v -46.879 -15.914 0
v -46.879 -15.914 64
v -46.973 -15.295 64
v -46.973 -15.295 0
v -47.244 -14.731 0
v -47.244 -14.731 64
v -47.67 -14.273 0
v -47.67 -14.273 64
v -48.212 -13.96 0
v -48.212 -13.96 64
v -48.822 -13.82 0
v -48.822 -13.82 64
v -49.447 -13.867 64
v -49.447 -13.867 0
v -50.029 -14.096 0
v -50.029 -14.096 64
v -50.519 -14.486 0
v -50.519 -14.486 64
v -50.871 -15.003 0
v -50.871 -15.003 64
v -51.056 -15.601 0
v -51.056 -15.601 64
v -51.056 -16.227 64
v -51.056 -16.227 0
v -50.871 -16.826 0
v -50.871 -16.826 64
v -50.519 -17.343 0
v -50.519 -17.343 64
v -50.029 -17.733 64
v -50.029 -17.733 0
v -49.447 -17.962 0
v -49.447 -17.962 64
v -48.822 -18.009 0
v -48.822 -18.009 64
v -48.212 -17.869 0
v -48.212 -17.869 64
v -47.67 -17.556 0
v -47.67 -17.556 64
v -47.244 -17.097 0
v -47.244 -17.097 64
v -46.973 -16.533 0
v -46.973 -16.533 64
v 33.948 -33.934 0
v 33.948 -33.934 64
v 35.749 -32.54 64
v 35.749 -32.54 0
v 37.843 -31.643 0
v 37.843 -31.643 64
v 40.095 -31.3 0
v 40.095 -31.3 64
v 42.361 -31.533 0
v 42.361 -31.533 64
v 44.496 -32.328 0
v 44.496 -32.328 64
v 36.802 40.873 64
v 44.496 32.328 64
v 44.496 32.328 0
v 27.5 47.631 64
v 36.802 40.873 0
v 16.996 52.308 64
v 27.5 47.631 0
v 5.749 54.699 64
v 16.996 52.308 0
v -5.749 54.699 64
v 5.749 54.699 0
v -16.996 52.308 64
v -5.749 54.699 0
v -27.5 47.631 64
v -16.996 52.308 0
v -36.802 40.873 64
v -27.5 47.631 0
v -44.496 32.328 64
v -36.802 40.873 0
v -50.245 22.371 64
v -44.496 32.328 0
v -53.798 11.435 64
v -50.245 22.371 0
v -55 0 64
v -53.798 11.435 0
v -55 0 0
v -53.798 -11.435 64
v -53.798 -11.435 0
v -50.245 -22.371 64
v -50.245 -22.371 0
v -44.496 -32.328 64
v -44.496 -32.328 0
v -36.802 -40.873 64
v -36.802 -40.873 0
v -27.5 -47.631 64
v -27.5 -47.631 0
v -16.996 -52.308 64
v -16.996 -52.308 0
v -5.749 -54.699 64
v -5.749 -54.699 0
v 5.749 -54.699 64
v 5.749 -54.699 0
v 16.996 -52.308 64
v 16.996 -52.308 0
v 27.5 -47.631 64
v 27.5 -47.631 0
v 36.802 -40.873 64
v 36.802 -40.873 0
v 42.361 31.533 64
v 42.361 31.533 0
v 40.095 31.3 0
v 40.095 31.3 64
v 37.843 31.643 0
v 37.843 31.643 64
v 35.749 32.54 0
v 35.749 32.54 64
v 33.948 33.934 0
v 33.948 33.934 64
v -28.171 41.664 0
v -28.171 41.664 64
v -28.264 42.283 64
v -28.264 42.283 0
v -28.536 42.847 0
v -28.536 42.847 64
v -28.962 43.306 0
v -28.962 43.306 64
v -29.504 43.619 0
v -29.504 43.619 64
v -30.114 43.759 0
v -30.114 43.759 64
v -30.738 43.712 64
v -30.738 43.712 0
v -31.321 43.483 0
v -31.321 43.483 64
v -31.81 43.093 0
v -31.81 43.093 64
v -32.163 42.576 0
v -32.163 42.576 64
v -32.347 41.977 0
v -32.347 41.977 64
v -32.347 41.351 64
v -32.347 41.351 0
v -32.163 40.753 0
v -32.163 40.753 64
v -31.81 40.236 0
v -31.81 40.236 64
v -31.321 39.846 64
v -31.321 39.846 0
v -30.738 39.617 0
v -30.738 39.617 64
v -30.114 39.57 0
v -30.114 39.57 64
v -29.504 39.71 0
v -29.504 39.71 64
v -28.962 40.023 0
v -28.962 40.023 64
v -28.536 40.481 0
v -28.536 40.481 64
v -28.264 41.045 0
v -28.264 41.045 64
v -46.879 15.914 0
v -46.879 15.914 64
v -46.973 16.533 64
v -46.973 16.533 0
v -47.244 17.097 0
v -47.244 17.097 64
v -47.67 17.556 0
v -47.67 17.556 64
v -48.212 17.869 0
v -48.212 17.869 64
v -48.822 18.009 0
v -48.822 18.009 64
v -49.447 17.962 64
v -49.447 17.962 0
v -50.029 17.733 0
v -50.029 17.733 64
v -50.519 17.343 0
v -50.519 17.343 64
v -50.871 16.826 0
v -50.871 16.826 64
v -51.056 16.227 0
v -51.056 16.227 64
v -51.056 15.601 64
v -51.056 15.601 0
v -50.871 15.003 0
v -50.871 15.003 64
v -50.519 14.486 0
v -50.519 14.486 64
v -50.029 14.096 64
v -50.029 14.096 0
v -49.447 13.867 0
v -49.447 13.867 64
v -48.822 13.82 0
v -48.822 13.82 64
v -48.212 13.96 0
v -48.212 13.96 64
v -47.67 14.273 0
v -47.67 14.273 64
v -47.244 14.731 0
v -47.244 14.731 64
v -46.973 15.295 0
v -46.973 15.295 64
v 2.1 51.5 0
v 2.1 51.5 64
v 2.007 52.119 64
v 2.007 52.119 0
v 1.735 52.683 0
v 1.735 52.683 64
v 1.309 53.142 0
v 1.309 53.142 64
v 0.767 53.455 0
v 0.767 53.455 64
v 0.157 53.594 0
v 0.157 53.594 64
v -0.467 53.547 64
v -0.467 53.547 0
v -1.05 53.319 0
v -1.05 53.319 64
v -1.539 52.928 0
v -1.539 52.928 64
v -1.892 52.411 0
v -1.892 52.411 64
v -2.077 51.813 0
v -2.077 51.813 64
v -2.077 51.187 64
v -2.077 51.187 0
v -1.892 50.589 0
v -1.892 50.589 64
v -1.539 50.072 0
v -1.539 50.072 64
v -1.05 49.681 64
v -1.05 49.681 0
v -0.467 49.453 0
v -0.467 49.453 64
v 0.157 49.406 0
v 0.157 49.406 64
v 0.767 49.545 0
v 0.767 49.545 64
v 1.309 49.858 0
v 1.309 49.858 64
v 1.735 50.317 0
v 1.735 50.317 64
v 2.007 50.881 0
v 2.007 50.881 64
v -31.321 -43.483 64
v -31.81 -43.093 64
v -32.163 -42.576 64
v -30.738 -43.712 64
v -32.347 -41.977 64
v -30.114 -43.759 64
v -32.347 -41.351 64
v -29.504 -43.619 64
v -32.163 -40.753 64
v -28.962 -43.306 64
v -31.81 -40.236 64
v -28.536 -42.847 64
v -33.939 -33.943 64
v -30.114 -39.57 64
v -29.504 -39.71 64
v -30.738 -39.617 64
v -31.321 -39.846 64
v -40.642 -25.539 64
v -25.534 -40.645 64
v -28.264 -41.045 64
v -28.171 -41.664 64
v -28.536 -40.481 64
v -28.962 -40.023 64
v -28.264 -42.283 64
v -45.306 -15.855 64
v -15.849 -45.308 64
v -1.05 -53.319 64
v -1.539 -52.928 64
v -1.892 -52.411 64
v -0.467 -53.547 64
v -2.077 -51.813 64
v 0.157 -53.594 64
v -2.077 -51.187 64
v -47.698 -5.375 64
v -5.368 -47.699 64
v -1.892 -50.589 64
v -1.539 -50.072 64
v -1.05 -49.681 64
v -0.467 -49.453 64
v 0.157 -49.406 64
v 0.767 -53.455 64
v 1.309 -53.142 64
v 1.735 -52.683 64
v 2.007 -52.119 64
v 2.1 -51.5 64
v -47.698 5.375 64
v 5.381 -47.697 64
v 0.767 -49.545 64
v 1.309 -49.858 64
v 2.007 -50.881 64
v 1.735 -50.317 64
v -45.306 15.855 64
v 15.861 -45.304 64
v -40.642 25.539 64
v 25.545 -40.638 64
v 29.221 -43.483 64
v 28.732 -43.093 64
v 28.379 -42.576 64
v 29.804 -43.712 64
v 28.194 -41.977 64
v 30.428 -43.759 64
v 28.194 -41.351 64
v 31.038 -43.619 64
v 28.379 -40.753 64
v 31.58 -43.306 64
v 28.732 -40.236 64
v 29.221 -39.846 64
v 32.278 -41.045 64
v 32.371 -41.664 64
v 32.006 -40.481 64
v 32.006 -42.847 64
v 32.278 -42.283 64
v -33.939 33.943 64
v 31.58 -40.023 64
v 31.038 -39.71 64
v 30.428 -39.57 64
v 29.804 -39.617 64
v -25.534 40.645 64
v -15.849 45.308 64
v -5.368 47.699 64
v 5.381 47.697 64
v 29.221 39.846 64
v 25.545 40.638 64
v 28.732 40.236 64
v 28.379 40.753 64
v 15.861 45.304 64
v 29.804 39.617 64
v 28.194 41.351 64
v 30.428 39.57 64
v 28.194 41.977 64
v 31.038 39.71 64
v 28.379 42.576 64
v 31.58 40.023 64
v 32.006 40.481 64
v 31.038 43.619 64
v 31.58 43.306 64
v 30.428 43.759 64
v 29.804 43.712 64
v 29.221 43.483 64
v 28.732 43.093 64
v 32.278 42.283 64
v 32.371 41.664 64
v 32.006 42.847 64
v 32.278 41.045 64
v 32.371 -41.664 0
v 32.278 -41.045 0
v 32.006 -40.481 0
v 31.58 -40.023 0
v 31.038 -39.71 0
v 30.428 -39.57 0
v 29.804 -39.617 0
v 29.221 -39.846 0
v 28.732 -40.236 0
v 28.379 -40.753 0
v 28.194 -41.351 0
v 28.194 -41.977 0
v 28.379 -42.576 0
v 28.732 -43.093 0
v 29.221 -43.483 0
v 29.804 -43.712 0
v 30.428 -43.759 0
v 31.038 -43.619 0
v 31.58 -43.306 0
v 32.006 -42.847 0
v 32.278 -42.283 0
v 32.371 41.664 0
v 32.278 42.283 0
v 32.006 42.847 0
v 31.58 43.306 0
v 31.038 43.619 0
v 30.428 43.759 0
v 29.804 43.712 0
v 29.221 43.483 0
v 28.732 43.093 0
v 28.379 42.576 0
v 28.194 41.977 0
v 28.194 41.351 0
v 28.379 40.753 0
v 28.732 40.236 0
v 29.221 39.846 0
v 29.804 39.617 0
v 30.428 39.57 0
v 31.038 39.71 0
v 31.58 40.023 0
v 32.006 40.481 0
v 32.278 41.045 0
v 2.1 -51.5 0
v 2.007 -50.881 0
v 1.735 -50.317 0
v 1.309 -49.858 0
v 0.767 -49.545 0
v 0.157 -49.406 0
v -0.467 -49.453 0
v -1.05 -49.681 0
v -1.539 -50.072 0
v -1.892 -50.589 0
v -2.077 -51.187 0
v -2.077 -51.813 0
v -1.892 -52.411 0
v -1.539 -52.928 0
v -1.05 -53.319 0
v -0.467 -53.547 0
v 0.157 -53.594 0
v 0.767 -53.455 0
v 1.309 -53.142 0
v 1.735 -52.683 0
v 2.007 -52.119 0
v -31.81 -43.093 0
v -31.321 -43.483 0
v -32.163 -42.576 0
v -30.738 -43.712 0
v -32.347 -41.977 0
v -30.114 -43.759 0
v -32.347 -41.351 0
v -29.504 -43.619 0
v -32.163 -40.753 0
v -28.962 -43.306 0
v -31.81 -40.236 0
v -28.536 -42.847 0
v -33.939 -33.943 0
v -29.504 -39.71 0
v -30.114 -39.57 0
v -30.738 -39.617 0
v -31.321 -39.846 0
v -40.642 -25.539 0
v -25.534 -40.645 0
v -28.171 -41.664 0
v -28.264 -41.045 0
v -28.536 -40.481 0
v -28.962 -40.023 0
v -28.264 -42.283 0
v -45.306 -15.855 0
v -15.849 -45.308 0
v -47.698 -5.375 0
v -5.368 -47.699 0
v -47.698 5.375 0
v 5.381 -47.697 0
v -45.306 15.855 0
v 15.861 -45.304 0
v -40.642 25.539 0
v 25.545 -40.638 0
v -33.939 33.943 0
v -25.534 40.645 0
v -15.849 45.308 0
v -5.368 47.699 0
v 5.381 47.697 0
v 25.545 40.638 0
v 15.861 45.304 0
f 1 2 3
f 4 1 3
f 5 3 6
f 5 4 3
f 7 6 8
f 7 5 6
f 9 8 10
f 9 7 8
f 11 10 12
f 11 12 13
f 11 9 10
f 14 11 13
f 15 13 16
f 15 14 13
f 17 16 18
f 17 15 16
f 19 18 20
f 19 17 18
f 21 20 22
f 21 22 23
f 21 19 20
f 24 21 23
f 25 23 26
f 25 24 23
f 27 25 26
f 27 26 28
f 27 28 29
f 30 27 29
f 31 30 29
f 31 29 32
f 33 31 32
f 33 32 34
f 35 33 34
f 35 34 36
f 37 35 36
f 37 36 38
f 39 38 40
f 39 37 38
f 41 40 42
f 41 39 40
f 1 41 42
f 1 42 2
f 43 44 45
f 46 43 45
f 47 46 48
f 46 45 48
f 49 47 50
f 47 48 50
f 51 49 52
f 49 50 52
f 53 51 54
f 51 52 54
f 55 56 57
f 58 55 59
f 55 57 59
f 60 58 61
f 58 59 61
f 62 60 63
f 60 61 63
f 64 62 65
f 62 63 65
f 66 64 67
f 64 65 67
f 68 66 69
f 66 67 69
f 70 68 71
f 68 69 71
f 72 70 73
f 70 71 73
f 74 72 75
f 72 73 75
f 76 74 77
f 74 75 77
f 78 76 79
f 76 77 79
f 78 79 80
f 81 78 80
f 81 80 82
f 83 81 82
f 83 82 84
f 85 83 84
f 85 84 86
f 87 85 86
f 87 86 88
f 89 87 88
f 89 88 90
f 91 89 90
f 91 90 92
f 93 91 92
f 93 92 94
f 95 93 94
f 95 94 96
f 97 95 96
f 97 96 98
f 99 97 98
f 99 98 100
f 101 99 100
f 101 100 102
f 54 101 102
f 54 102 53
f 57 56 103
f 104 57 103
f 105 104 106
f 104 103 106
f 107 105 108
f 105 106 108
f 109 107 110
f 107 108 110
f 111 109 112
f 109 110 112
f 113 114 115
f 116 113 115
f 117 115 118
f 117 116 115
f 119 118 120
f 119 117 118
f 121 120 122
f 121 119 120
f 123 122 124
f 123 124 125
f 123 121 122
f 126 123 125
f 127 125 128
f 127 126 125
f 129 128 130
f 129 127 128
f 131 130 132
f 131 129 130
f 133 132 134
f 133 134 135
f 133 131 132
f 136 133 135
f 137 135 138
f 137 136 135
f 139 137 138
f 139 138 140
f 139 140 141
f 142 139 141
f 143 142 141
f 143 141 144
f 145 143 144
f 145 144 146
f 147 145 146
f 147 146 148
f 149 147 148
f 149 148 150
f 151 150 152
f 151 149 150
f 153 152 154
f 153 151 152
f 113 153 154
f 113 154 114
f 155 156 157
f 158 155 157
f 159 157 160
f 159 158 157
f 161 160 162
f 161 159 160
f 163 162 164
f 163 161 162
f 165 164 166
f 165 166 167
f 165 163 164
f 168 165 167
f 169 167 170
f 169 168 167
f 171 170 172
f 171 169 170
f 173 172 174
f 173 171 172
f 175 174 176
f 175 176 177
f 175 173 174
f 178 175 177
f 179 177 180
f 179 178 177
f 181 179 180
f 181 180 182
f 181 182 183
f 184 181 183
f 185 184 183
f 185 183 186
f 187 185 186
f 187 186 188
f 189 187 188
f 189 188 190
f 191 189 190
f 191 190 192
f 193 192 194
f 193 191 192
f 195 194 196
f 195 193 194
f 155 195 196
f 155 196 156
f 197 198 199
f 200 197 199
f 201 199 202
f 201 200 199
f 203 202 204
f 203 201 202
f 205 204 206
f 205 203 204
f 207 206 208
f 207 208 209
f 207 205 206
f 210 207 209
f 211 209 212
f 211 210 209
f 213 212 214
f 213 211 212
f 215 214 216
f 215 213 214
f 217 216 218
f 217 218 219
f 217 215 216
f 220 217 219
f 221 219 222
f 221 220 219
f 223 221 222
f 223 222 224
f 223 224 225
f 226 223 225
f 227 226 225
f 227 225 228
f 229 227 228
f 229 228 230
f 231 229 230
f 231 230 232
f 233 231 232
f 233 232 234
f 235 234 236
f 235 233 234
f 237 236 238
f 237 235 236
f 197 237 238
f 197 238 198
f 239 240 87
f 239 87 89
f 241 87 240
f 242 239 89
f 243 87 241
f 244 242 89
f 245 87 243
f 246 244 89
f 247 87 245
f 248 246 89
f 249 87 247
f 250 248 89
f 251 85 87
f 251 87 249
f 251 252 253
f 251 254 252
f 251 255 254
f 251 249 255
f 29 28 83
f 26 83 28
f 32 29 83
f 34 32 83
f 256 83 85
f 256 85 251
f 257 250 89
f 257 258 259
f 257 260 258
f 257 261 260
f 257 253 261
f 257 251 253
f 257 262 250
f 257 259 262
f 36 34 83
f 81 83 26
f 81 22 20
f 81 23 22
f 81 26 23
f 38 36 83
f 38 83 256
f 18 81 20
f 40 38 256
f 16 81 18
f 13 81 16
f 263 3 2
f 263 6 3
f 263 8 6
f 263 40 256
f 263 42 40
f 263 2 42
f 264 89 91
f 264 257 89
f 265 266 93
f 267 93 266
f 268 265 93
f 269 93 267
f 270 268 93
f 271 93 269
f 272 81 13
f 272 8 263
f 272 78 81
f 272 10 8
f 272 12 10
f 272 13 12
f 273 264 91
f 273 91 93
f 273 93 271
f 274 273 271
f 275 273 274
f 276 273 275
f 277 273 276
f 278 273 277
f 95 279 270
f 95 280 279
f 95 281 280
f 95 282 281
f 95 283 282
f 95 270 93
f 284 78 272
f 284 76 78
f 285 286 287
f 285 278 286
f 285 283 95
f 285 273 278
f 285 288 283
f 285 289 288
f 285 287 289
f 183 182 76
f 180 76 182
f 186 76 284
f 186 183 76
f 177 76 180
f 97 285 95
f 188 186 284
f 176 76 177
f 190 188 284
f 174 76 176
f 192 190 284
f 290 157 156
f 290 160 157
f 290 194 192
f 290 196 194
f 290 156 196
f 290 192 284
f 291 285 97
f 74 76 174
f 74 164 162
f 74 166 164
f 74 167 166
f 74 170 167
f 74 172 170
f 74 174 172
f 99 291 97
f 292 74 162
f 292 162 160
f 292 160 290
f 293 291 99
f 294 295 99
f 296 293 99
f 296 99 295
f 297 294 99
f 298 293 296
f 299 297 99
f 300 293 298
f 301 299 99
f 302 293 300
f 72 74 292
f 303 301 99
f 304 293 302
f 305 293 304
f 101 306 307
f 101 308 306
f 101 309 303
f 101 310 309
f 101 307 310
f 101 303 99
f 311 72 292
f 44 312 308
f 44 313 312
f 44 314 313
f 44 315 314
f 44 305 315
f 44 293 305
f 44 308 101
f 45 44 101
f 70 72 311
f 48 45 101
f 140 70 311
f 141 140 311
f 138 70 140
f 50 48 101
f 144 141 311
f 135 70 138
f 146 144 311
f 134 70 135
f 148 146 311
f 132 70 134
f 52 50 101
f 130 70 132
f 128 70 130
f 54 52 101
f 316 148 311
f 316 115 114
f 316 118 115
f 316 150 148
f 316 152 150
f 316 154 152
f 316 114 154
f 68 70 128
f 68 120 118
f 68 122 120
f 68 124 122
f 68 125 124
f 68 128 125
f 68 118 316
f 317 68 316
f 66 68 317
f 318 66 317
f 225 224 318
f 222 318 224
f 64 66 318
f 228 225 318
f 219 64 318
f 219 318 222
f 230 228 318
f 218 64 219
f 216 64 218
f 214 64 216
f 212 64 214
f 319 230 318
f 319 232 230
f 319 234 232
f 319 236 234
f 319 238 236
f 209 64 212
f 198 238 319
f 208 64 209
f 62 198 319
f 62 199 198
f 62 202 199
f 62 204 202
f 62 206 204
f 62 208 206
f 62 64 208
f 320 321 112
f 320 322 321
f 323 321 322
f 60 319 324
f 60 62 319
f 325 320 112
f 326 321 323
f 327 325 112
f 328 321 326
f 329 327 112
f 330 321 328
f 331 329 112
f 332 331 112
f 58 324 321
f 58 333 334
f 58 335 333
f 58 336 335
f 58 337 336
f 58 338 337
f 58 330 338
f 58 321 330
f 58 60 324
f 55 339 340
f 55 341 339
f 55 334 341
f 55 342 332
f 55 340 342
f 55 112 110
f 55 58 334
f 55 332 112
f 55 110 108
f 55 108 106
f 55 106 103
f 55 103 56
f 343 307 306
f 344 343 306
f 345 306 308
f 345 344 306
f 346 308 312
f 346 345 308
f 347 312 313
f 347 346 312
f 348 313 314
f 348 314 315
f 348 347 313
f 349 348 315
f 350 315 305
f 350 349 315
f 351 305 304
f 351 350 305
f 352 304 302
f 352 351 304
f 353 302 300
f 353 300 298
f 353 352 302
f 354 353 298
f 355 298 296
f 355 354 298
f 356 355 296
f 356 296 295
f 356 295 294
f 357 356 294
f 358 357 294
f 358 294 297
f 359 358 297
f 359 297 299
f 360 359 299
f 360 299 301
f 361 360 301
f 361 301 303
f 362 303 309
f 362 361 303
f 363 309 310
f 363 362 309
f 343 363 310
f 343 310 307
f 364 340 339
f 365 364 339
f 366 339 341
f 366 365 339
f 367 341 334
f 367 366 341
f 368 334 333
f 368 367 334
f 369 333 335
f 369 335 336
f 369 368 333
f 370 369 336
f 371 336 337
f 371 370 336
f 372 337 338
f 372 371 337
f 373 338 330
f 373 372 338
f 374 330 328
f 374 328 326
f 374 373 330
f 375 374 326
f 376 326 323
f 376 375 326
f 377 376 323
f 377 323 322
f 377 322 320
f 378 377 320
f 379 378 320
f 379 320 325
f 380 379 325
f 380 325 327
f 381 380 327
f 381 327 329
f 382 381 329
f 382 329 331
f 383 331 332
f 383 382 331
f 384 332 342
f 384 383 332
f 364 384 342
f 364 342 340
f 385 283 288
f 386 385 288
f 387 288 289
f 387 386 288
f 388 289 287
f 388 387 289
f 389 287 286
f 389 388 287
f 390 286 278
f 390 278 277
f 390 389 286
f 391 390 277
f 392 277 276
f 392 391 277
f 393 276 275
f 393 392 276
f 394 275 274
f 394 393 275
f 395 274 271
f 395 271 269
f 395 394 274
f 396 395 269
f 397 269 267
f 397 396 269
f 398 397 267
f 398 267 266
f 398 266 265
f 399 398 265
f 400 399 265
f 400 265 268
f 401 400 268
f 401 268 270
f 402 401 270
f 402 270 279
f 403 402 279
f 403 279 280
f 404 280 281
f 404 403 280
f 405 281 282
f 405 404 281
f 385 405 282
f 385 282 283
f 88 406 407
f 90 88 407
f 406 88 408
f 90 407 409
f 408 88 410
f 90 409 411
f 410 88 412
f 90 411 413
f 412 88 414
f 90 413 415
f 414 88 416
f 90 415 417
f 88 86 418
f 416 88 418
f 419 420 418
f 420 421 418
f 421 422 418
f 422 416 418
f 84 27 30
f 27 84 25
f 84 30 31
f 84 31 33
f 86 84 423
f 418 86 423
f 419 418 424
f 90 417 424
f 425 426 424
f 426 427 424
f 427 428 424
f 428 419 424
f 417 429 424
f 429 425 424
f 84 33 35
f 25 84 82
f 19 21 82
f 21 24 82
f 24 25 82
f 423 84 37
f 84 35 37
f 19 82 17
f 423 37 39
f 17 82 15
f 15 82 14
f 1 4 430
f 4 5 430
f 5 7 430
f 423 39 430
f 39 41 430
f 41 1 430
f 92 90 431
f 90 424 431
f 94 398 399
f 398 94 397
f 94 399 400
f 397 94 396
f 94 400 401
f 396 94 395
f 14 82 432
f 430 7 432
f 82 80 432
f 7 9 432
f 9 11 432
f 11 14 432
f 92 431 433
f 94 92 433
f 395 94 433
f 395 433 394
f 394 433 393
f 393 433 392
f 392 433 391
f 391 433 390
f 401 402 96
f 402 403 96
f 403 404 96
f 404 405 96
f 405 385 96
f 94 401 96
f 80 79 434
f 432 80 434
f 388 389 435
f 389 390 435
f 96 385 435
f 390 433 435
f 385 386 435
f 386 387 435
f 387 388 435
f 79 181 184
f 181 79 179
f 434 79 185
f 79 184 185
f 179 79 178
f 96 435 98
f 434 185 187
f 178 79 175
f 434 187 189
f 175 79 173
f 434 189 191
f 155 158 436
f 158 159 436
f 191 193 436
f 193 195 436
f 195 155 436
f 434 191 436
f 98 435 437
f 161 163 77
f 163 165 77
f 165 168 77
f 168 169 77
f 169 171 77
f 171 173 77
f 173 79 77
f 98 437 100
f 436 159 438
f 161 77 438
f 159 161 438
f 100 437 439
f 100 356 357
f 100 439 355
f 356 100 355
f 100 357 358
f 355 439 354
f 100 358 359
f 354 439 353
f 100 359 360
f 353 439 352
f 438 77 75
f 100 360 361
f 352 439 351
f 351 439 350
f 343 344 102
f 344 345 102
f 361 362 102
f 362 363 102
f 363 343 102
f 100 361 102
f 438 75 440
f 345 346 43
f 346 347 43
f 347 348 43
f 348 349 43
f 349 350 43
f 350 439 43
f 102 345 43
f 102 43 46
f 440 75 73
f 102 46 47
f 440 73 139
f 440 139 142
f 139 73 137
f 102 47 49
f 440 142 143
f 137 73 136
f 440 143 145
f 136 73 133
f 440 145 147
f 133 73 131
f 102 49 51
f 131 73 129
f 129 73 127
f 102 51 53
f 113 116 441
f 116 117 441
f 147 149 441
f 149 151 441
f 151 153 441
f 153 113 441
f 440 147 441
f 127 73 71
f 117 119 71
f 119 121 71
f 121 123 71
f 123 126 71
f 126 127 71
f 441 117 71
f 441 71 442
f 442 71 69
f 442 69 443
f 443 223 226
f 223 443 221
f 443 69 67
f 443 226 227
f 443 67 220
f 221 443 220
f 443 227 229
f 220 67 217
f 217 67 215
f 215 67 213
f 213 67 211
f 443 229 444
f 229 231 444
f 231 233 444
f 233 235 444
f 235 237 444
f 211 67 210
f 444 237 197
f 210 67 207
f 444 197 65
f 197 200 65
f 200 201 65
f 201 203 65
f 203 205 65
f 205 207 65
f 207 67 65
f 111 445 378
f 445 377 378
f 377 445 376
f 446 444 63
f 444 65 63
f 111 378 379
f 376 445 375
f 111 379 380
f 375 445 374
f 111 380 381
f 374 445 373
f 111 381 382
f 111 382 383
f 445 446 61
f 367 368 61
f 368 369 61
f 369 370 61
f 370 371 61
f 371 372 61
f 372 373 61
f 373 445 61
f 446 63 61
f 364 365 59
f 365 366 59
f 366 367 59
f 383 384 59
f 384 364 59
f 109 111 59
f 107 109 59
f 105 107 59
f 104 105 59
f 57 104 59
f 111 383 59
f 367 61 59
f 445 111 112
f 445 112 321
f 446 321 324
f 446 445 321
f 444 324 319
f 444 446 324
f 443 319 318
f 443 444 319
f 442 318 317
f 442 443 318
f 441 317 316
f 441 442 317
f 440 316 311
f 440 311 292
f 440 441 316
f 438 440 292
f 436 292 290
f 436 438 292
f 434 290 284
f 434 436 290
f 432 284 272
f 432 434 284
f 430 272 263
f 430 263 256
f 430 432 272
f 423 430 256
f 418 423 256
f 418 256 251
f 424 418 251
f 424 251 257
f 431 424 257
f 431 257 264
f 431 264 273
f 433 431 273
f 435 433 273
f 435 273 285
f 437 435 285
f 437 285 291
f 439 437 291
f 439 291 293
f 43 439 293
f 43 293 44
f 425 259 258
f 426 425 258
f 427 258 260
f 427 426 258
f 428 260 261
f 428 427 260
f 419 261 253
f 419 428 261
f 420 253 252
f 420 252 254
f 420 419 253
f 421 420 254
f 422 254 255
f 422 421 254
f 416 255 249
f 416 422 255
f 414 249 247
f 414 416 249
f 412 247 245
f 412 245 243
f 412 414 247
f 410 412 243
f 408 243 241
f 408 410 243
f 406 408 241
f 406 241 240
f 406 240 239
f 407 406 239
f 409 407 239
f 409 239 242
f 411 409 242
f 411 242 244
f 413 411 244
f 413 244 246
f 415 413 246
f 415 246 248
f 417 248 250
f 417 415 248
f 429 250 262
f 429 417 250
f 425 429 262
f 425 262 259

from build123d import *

# Parameters (mm, degrees)
ESQUISSE1_R             = 55
ESQUISSE1_R_2           = 48
ESQUISSE1_R_3           = 2.1
BOSS_EXTRU_1_DEPTH      = 64
ENL_V_MAT_EXTRU_1_DEPTH = 101.727354775
CONG_1_R                = 9


with BuildPart() as part:
    # Esquisse1 → Boss.-Extru.1 (new body)
    with BuildSketch(Plane.XY):
        Circle(ESQUISSE1_R)
        Circle(ESQUISSE1_R_2, mode=Mode.SUBTRACT)
        with Locations((0, 51.5)):
            Circle(ESQUISSE1_R_3, mode=Mode.SUBTRACT)
        with Locations((30.270940493, 41.66437521)):
            Circle(ESQUISSE1_R_3, mode=Mode.SUBTRACT)
        with Locations((48.979410589, 15.91437521)):
            Circle(ESQUISSE1_R_3, mode=Mode.SUBTRACT)
        with Locations((48.979410589, -15.91437521)):
            Circle(ESQUISSE1_R_3, mode=Mode.SUBTRACT)
        with Locations((30.270940493, -41.66437521)):
            Circle(ESQUISSE1_R_3, mode=Mode.SUBTRACT)
        with Locations((0, -51.5)):
            Circle(ESQUISSE1_R_3, mode=Mode.SUBTRACT)
        with Locations((-30.270940493, -41.66437521)):
            Circle(ESQUISSE1_R_3, mode=Mode.SUBTRACT)
        with Locations((-48.979410589, -15.91437521)):
            Circle(ESQUISSE1_R_3, mode=Mode.SUBTRACT)
        with Locations((-48.979410589, 15.91437521)):
            Circle(ESQUISSE1_R_3, mode=Mode.SUBTRACT)
        with Locations((-30.270940493, 41.66437521)):
            Circle(ESQUISSE1_R_3, mode=Mode.SUBTRACT)
    extrude(amount=BOSS_EXTRU_1_DEPTH)

    # Esquisse3 → Enlèv. mat.-Extru.1 (cut, through all)
    with BuildSketch(Plane.XY.offset(64)):
        Polygon((0, 0), (60, 43.59255168), (60, -43.59255168), align=None)
    extrude(amount=-ENL_V_MAT_EXTRU_1_DEPTH, mode=Mode.SUBTRACT)

    # Congé1
    # the kernel refuses this fillet: 9 mm, written as the material it takes off along each edge
    with BuildSketch(Plane(origin=(38.83281573, -28.21369211, 82.806493839), x_dir=(0.809016994374856, -0.5877852522925988, 0), z_dir=(0, 0, -1))) as cong_1_piece_1:
        with BuildLine():
            CenterArc((8.3, 8.905616206), CONG_1_R, 188.98865434, 72.706236132)
            Line((-0.589473684, 7.499466278), (-0.767263158, 7.47134328))
            ThreePointArc((-0.767263158, 7.47134328), (-0.327041859, 3.747193897), (-0.18, 0))
            Line((-0.18, 0), (0, -0.18))
            ThreePointArc((0, -0.18), (3.5, -0.18), (6.974, -0.178112324))
            Line((6.974, -0.178112324), (7, 0))
        make_face()
    extrude(amount=101.612987679, mode=Mode.SUBTRACT)
    with BuildSketch(Plane(origin=(38.83281573, 28.21369211, 82.806493839), x_dir=(0.8090169943748586, 0.5877852522925953, 0), z_dir=(0, 0, -1))) as cong_1_piece_2:
        with BuildLine():
            CenterArc((8.3, -8.905616206), CONG_1_R, 98.305109528, 72.706236132)
            Line((-0.589473684, -7.499466278), (-0.767263158, -7.47134328))
            ThreePointArc((-0.767263158, -7.47134328), (-0.327041859, -3.747193897), (-0.18, 0))
            Line((-0.18, 0), (0, 0.18))
            ThreePointArc((0, 0.18), (3.5, 0.18), (6.974, 0.178112324))
            Line((6.974, 0.178112324), (7, 0))
        make_face()
    extrude(amount=101.612987679, mode=Mode.SUBTRACT)


solid = part.part
